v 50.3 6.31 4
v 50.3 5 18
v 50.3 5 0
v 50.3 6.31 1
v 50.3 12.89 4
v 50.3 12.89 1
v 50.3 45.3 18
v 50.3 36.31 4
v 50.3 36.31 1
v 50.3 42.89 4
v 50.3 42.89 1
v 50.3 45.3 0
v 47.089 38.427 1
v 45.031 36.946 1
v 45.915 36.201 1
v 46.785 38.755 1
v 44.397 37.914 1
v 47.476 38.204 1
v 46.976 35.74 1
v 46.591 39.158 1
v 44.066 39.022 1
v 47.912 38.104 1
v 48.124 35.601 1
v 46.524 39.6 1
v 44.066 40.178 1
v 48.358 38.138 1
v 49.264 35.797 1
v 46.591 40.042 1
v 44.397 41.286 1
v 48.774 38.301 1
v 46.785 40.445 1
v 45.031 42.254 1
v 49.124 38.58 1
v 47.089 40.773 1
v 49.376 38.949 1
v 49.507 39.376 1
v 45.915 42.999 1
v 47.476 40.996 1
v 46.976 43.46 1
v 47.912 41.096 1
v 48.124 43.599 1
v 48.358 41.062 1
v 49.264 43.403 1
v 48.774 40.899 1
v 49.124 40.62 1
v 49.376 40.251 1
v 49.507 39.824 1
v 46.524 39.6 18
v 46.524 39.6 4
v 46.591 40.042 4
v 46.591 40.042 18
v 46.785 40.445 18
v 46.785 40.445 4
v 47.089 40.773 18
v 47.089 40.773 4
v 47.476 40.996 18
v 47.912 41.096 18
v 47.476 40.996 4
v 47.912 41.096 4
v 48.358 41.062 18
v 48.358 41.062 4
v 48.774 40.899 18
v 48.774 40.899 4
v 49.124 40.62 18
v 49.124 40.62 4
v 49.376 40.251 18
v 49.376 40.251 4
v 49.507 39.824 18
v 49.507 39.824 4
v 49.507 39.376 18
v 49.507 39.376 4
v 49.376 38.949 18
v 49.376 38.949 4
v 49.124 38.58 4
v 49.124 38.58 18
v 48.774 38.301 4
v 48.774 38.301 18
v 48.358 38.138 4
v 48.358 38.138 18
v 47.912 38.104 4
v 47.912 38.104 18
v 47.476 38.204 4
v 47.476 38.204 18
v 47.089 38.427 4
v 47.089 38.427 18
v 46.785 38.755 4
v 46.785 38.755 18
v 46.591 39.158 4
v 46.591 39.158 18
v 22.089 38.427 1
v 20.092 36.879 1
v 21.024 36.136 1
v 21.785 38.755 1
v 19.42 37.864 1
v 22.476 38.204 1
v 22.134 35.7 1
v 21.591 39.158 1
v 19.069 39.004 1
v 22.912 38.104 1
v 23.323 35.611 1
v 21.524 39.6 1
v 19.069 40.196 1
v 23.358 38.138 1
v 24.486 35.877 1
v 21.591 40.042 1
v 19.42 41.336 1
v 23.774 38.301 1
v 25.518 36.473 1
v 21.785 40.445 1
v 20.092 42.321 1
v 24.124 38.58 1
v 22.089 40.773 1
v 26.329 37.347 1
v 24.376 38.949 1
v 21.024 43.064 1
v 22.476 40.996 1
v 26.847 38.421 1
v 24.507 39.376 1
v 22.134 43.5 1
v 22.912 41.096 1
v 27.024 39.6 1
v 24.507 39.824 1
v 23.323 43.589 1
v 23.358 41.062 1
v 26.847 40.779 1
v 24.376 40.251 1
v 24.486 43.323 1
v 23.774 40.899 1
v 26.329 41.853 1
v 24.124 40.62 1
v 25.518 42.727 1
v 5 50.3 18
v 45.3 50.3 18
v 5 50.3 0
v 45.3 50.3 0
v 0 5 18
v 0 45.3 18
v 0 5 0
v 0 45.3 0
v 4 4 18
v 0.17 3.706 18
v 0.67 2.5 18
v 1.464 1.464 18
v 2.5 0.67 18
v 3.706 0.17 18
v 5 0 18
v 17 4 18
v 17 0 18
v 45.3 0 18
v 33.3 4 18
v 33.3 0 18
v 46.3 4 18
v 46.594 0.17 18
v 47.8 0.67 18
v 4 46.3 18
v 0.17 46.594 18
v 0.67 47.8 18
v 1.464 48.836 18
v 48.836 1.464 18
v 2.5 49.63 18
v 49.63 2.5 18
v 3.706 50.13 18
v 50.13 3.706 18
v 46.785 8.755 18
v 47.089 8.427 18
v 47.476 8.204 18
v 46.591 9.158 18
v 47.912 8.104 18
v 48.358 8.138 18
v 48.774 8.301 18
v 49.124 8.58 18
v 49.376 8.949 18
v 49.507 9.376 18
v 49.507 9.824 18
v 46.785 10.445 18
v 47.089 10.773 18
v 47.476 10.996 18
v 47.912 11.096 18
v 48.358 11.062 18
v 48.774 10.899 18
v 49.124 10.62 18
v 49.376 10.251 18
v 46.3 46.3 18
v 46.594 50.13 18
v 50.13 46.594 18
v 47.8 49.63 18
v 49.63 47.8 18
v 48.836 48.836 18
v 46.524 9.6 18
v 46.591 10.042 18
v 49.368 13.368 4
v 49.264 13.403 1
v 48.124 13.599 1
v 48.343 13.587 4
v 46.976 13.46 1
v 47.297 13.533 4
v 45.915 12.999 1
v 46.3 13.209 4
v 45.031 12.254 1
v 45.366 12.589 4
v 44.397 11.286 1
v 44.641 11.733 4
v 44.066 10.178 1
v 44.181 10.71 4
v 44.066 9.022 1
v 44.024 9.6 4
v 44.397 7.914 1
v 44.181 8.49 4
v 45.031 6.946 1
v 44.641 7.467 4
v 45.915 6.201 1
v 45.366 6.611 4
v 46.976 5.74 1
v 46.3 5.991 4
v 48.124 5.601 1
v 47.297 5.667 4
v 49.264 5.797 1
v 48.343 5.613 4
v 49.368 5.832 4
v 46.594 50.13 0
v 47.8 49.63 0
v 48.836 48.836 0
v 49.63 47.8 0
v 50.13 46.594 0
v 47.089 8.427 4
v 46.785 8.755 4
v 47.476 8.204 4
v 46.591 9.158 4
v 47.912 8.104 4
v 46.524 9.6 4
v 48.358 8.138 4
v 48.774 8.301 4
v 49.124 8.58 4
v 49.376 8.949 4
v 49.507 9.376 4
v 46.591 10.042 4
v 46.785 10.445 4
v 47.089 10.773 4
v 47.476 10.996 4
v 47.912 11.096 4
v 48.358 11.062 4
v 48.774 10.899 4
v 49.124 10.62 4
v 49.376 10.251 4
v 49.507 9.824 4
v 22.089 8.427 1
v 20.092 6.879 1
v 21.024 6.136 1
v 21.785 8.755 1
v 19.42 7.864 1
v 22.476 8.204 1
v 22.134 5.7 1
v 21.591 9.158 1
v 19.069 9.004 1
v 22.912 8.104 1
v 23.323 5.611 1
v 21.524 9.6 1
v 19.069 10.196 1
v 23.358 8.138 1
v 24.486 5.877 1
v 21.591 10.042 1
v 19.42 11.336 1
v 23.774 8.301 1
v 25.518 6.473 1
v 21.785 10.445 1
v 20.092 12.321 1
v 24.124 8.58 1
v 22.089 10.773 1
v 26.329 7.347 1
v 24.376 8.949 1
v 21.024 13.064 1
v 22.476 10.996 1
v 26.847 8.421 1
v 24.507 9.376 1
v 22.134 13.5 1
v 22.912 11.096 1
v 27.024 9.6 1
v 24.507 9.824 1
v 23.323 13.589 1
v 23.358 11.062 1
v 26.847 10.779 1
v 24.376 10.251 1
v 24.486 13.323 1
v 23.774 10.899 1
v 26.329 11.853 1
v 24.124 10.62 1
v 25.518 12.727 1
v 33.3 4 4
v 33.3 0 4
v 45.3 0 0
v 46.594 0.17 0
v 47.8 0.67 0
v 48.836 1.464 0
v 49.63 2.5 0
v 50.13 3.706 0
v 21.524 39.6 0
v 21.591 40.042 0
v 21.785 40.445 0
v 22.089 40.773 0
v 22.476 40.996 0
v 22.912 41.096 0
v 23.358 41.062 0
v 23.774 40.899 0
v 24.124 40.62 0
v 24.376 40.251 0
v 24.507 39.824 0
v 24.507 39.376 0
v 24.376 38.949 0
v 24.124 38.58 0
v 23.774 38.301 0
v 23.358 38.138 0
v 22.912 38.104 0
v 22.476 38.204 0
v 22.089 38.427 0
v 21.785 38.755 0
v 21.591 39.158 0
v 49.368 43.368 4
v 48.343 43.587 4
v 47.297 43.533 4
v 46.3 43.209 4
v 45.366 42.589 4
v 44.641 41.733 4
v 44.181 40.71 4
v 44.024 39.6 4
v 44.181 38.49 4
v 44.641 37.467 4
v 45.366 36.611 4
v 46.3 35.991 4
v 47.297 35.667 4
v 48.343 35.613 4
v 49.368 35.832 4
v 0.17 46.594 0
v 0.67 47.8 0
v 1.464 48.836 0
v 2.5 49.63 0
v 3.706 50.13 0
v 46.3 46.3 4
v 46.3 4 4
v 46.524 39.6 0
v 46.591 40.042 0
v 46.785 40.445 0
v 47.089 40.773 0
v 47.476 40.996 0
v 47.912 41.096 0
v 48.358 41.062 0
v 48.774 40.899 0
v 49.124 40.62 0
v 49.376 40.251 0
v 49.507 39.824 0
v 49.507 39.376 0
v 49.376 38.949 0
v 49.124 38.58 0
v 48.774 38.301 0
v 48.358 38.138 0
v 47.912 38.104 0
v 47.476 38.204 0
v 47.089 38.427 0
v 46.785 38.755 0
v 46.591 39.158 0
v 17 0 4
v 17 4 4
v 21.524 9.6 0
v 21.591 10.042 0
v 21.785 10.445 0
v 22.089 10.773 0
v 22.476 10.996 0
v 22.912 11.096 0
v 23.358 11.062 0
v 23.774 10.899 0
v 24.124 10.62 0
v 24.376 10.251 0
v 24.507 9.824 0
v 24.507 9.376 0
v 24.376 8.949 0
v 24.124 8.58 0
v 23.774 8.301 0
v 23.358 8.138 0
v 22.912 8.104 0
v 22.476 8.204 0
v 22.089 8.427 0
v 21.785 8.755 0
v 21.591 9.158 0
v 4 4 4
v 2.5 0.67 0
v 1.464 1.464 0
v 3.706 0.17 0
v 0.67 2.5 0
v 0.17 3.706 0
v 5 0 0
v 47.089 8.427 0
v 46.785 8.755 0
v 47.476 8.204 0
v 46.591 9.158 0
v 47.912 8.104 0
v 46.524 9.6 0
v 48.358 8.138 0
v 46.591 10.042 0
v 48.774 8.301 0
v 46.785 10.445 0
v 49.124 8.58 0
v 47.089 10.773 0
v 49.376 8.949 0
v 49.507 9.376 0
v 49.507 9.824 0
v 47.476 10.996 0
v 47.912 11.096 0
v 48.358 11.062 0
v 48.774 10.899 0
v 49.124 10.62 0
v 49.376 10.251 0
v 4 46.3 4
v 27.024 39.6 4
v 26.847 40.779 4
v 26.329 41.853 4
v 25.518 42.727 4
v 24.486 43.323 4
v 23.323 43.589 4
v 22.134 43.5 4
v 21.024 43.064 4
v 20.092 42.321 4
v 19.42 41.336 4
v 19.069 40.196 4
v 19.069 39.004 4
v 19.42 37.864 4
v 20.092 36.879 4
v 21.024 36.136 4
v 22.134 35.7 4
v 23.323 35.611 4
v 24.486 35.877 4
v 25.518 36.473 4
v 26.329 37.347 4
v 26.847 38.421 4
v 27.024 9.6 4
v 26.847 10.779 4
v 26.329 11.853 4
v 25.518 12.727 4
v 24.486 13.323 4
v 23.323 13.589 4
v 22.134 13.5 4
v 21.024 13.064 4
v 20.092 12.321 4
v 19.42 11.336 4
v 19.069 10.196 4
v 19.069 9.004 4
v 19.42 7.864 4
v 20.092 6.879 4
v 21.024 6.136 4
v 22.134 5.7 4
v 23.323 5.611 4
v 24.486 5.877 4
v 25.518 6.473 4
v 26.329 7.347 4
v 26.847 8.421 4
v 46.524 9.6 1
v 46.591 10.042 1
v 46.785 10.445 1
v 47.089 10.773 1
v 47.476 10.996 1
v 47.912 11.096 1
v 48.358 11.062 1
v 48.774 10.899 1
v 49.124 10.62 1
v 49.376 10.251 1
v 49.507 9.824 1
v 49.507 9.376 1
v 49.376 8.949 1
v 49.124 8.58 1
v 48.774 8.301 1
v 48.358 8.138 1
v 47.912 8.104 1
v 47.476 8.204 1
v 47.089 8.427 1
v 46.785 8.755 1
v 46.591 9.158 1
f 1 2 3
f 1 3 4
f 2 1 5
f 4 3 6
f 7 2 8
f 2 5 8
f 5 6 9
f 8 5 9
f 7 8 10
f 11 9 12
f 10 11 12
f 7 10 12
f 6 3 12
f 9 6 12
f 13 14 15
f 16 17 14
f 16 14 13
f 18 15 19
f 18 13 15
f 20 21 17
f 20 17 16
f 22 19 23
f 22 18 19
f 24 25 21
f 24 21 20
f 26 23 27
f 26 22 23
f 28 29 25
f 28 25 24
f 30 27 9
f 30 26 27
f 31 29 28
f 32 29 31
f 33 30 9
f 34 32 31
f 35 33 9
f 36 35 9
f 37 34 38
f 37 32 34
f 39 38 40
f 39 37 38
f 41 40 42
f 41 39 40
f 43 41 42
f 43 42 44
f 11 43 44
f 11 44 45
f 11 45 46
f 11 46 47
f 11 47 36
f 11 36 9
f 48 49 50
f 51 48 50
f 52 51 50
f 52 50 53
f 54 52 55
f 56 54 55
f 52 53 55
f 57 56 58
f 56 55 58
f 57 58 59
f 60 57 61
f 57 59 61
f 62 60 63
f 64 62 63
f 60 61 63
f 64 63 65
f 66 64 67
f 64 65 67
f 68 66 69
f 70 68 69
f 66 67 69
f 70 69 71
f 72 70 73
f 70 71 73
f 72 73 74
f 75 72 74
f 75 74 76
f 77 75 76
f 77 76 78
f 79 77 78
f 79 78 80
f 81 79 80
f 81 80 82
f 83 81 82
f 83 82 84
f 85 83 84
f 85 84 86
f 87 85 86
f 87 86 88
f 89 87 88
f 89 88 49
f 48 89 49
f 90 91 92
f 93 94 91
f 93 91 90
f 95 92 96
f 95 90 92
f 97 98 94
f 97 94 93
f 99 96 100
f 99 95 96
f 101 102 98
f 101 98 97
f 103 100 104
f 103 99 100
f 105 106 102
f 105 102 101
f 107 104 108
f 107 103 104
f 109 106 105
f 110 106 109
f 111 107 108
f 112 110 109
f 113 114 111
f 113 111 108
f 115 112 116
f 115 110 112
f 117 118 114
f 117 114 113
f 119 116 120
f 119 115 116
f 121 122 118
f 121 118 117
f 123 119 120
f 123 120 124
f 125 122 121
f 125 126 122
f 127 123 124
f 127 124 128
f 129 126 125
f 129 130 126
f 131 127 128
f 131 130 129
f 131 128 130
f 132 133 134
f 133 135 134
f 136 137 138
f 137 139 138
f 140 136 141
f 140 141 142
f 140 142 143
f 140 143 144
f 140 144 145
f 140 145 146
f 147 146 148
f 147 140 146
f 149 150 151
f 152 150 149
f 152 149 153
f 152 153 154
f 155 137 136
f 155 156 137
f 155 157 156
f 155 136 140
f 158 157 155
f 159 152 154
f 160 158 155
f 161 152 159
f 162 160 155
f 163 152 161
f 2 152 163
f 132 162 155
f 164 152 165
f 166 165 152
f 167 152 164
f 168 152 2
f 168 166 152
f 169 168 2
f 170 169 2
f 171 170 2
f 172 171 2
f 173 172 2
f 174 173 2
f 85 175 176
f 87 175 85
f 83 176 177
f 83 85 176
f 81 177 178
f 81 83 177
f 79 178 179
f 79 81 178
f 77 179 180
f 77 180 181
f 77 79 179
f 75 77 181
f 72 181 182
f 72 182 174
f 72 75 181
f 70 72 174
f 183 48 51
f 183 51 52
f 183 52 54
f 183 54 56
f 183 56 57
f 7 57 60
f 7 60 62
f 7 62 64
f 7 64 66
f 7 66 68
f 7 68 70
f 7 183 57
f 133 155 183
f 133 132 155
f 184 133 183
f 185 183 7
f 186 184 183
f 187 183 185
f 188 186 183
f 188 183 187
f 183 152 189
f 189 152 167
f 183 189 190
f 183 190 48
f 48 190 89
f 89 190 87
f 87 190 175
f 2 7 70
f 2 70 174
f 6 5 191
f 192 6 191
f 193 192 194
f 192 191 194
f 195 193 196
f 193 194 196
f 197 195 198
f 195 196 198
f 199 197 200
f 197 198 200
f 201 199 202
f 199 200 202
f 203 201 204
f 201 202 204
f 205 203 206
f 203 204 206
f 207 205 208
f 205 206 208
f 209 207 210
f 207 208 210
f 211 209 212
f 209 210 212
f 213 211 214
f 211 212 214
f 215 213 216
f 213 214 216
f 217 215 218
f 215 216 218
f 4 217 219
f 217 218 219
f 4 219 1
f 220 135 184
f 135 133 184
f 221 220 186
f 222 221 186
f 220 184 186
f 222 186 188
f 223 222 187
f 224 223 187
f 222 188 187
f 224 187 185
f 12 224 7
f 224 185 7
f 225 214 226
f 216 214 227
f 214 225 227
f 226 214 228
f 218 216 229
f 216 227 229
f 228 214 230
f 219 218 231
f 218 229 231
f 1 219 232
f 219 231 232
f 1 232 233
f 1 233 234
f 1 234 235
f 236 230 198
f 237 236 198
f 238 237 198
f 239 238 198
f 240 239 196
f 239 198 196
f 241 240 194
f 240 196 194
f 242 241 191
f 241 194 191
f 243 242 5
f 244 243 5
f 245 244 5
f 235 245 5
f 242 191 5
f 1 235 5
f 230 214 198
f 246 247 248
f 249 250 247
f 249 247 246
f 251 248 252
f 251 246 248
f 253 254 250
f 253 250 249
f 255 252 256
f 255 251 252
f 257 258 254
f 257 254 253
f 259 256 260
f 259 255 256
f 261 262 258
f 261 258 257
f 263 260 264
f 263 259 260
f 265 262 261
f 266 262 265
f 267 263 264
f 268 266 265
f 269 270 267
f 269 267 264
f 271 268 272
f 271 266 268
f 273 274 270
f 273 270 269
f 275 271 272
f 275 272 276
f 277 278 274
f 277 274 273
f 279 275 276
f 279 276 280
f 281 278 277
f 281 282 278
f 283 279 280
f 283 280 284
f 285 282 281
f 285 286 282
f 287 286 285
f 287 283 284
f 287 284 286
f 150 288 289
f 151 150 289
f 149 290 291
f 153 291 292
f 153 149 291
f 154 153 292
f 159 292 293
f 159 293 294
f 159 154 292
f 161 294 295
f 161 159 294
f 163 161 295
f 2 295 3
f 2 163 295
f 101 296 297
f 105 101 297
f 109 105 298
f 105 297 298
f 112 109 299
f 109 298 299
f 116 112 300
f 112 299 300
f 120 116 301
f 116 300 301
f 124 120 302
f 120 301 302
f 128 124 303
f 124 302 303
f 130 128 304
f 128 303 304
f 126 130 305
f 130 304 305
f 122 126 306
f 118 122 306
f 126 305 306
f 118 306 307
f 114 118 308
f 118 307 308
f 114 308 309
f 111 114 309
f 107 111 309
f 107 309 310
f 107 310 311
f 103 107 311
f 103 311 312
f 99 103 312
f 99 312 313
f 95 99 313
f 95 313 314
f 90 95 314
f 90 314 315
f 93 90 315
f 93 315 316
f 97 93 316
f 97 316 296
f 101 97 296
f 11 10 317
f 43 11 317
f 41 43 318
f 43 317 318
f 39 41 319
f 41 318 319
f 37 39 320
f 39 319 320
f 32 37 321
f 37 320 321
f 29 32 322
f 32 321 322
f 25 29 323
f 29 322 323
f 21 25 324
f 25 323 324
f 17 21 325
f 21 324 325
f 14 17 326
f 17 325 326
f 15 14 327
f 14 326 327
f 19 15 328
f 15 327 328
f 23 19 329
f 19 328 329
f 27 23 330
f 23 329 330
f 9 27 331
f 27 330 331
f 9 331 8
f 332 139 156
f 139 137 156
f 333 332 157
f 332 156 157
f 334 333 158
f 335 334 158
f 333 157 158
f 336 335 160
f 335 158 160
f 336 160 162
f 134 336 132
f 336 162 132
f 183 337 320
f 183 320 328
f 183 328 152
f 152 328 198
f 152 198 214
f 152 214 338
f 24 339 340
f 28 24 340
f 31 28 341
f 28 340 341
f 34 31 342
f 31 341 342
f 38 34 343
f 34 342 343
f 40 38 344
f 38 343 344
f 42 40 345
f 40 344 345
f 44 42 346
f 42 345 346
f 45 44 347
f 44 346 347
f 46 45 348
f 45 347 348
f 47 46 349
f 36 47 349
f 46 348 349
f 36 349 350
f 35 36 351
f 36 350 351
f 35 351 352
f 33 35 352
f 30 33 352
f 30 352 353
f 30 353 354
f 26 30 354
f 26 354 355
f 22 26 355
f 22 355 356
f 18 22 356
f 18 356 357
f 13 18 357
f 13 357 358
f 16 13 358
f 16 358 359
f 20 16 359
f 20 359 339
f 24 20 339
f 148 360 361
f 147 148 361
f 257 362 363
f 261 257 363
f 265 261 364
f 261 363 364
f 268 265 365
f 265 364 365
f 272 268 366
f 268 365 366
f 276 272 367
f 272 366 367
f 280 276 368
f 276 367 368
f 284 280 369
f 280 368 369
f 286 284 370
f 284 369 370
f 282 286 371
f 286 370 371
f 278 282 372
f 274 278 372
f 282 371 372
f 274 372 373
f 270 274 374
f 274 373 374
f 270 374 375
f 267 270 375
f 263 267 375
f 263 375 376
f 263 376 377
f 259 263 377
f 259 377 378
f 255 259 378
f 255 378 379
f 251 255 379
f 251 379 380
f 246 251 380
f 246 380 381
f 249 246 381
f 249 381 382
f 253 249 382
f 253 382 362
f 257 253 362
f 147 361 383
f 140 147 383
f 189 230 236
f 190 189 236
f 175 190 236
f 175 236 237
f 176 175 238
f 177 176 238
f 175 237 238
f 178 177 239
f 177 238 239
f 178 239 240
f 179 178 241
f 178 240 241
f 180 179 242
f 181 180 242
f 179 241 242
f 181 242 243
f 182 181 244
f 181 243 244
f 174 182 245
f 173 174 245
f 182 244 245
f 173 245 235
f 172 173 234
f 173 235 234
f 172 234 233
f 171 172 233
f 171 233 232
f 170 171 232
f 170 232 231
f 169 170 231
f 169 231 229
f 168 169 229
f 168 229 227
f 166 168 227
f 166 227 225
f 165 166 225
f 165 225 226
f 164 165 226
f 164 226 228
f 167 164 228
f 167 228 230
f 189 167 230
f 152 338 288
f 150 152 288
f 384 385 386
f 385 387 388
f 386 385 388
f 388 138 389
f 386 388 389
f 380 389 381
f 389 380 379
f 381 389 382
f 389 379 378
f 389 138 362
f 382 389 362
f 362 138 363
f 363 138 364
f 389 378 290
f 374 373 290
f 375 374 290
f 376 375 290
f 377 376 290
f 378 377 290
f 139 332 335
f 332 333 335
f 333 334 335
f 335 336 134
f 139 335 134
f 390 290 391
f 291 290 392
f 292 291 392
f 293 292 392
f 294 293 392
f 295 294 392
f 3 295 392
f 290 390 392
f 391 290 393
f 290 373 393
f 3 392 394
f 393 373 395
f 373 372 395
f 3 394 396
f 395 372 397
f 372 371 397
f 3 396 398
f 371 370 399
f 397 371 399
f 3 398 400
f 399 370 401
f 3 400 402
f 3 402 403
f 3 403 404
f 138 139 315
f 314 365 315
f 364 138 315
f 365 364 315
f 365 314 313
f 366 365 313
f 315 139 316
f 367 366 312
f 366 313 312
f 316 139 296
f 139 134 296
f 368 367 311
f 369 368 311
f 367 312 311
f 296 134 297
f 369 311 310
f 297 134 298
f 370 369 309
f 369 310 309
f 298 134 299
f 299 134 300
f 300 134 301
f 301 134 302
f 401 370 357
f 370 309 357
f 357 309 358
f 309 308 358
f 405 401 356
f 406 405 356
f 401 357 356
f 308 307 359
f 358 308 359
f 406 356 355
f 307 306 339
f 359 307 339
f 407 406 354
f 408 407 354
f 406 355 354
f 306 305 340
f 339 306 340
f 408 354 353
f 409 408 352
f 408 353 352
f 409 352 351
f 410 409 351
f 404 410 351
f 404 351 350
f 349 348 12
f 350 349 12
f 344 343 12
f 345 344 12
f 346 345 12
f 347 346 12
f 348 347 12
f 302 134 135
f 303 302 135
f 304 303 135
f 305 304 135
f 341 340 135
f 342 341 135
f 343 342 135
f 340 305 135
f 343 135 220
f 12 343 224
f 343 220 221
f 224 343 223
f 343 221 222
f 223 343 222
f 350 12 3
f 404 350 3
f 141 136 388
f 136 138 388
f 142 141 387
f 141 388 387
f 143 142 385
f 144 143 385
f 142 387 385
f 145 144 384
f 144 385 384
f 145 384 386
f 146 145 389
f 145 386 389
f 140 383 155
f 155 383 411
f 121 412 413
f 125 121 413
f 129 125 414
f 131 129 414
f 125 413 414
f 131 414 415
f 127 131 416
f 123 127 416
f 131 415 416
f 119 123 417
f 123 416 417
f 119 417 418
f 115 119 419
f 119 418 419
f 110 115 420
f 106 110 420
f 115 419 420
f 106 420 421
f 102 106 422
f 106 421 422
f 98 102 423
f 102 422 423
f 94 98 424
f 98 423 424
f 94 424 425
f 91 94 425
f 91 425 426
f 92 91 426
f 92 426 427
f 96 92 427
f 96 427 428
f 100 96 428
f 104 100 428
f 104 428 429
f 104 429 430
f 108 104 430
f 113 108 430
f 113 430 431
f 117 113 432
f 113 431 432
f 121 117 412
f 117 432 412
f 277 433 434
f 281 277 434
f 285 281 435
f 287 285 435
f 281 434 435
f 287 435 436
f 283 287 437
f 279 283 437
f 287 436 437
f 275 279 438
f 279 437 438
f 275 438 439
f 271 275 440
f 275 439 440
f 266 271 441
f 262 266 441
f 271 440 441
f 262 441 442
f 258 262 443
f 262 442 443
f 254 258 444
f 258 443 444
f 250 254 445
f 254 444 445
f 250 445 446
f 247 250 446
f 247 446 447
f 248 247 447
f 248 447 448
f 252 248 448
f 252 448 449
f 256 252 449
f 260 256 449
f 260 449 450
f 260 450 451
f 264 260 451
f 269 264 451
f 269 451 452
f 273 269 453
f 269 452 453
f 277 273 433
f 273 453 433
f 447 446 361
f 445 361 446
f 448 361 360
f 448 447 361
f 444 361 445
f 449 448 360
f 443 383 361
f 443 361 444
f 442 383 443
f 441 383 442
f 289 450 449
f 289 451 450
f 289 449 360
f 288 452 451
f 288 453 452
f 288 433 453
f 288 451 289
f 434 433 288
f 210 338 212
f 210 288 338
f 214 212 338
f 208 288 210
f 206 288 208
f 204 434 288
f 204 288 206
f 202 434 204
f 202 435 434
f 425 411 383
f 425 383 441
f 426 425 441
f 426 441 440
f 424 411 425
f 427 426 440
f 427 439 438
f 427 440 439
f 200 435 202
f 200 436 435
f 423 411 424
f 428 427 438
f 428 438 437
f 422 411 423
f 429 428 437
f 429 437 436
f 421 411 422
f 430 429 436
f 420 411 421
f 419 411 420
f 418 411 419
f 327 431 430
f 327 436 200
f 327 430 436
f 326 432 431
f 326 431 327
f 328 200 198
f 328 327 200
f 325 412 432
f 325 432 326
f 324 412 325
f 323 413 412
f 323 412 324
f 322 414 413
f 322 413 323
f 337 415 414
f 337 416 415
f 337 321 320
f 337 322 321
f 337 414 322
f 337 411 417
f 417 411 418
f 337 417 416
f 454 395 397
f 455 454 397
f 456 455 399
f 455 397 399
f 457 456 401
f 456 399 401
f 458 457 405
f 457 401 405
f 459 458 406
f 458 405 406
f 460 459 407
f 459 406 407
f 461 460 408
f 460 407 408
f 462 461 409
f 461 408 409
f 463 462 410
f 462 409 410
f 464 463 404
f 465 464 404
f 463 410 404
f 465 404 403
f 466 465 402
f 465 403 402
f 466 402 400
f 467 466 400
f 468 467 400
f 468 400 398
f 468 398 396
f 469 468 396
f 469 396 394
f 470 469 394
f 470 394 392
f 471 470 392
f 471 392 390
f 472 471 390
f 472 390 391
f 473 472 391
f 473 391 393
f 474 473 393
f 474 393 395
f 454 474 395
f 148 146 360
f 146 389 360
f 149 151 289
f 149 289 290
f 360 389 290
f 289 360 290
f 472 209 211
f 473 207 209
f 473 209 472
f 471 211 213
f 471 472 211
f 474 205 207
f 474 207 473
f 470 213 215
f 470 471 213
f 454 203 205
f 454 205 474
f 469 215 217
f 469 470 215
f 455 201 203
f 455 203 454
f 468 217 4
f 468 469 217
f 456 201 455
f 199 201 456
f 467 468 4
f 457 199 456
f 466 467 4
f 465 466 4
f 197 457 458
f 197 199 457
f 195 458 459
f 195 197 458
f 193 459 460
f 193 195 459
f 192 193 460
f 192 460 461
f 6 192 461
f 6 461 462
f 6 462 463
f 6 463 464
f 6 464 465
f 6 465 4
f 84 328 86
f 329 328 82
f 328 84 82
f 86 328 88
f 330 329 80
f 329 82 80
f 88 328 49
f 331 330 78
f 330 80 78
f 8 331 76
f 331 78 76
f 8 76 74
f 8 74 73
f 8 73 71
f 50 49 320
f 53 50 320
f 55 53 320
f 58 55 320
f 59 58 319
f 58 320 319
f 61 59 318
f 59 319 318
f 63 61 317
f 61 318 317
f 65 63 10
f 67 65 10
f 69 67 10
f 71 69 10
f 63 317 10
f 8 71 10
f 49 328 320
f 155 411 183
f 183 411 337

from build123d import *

# Parameters (mm, degrees)
ESQUISSE1_W             = 50.3
ESQUISSE1_H             = 50.3
BOSS_EXTRU_1_DEPTH      = 4
BOSS_EXTRU_2_DEPTH      = 14
ESQUISSE3_R             = 1.5
ENL_V_MAT_EXTRU_1_DEPTH = 74.376971864
CONG_2_R                = 5
ESQUISSE4_R             = 4
ENL_V_MAT_EXTRU_2_DEPTH = 3
CONG_6_R                = 5


with BuildPart() as part:
    # Esquisse1 → Boss.-Extru.1 (new body)
    with BuildSketch(Plane.XY):
        with Locations((25.15, 25.15)):
            Rectangle(ESQUISSE1_W, ESQUISSE1_H)
    extrude(amount=BOSS_EXTRU_1_DEPTH)

    # Esquisse2 → Boss.-Extru.2 (add)
    with BuildSketch(Plane.XY.offset(4)):
        Polygon((4, 46.3), (46.3, 46.3), (46.3, 4), (33.3, 4), (33.3, 0), (50.3, 0), (50.3, 50.3), (0, 50.3), (0, 0), (17, 0), (17, 4), (4, 4), align=None)
    extrude(amount=BOSS_EXTRU_2_DEPTH)

    # Esquisse3 → Enlèv. mat.-Extru.1 (cut, through all)
    with BuildSketch(Plane(origin=(0, 0, 0), x_dir=(-1, 0, 0), z_dir=(0, 0, -1))):
        with Locations((-23.024217253, 39.6)):
            Circle(ESQUISSE3_R)
        with Locations((-48.024217253, 39.6)):
            Circle(ESQUISSE3_R)
        with Locations((-48.024217253, 9.6)):
            Circle(ESQUISSE3_R)
        with Locations((-23.024217253, 9.6)):
            Circle(ESQUISSE3_R)
    extrude(amount=-ENL_V_MAT_EXTRU_1_DEPTH, mode=Mode.SUBTRACT)

    # Congé2
    cong_2_edges = [part.edges().sort_by_distance(p)[0] for p in [
        (0, 50.3, 9),
    ]]
    fillet(cong_2_edges, radius=CONG_2_R)

    # Esquisse4 → Enlèv. mat.-Extru.2 (cut)
    with BuildSketch(Plane.XY.offset(4)):
        with Locations((23.024217253, 39.6)):
            Circle(ESQUISSE4_R)
        with Locations((23.024217253, 9.6)):
            Circle(ESQUISSE4_R)
        with Locations((48.024217253, 39.6)):
            Circle(ESQUISSE4_R)
        with Locations((48.024217253, 9.6)):
            Circle(ESQUISSE4_R)
    extrude(amount=-ENL_V_MAT_EXTRU_2_DEPTH, mode=Mode.SUBTRACT)

    # Congé6
    cong_6_edges = [part.edges().sort_by_distance(p)[0] for p in [
        (50.3, 50.3, 9),
        (50.3, 0, 9),
        (0, 0, 9),
    ]]
    fillet(cong_6_edges, radius=CONG_6_R)


solid = part.part
